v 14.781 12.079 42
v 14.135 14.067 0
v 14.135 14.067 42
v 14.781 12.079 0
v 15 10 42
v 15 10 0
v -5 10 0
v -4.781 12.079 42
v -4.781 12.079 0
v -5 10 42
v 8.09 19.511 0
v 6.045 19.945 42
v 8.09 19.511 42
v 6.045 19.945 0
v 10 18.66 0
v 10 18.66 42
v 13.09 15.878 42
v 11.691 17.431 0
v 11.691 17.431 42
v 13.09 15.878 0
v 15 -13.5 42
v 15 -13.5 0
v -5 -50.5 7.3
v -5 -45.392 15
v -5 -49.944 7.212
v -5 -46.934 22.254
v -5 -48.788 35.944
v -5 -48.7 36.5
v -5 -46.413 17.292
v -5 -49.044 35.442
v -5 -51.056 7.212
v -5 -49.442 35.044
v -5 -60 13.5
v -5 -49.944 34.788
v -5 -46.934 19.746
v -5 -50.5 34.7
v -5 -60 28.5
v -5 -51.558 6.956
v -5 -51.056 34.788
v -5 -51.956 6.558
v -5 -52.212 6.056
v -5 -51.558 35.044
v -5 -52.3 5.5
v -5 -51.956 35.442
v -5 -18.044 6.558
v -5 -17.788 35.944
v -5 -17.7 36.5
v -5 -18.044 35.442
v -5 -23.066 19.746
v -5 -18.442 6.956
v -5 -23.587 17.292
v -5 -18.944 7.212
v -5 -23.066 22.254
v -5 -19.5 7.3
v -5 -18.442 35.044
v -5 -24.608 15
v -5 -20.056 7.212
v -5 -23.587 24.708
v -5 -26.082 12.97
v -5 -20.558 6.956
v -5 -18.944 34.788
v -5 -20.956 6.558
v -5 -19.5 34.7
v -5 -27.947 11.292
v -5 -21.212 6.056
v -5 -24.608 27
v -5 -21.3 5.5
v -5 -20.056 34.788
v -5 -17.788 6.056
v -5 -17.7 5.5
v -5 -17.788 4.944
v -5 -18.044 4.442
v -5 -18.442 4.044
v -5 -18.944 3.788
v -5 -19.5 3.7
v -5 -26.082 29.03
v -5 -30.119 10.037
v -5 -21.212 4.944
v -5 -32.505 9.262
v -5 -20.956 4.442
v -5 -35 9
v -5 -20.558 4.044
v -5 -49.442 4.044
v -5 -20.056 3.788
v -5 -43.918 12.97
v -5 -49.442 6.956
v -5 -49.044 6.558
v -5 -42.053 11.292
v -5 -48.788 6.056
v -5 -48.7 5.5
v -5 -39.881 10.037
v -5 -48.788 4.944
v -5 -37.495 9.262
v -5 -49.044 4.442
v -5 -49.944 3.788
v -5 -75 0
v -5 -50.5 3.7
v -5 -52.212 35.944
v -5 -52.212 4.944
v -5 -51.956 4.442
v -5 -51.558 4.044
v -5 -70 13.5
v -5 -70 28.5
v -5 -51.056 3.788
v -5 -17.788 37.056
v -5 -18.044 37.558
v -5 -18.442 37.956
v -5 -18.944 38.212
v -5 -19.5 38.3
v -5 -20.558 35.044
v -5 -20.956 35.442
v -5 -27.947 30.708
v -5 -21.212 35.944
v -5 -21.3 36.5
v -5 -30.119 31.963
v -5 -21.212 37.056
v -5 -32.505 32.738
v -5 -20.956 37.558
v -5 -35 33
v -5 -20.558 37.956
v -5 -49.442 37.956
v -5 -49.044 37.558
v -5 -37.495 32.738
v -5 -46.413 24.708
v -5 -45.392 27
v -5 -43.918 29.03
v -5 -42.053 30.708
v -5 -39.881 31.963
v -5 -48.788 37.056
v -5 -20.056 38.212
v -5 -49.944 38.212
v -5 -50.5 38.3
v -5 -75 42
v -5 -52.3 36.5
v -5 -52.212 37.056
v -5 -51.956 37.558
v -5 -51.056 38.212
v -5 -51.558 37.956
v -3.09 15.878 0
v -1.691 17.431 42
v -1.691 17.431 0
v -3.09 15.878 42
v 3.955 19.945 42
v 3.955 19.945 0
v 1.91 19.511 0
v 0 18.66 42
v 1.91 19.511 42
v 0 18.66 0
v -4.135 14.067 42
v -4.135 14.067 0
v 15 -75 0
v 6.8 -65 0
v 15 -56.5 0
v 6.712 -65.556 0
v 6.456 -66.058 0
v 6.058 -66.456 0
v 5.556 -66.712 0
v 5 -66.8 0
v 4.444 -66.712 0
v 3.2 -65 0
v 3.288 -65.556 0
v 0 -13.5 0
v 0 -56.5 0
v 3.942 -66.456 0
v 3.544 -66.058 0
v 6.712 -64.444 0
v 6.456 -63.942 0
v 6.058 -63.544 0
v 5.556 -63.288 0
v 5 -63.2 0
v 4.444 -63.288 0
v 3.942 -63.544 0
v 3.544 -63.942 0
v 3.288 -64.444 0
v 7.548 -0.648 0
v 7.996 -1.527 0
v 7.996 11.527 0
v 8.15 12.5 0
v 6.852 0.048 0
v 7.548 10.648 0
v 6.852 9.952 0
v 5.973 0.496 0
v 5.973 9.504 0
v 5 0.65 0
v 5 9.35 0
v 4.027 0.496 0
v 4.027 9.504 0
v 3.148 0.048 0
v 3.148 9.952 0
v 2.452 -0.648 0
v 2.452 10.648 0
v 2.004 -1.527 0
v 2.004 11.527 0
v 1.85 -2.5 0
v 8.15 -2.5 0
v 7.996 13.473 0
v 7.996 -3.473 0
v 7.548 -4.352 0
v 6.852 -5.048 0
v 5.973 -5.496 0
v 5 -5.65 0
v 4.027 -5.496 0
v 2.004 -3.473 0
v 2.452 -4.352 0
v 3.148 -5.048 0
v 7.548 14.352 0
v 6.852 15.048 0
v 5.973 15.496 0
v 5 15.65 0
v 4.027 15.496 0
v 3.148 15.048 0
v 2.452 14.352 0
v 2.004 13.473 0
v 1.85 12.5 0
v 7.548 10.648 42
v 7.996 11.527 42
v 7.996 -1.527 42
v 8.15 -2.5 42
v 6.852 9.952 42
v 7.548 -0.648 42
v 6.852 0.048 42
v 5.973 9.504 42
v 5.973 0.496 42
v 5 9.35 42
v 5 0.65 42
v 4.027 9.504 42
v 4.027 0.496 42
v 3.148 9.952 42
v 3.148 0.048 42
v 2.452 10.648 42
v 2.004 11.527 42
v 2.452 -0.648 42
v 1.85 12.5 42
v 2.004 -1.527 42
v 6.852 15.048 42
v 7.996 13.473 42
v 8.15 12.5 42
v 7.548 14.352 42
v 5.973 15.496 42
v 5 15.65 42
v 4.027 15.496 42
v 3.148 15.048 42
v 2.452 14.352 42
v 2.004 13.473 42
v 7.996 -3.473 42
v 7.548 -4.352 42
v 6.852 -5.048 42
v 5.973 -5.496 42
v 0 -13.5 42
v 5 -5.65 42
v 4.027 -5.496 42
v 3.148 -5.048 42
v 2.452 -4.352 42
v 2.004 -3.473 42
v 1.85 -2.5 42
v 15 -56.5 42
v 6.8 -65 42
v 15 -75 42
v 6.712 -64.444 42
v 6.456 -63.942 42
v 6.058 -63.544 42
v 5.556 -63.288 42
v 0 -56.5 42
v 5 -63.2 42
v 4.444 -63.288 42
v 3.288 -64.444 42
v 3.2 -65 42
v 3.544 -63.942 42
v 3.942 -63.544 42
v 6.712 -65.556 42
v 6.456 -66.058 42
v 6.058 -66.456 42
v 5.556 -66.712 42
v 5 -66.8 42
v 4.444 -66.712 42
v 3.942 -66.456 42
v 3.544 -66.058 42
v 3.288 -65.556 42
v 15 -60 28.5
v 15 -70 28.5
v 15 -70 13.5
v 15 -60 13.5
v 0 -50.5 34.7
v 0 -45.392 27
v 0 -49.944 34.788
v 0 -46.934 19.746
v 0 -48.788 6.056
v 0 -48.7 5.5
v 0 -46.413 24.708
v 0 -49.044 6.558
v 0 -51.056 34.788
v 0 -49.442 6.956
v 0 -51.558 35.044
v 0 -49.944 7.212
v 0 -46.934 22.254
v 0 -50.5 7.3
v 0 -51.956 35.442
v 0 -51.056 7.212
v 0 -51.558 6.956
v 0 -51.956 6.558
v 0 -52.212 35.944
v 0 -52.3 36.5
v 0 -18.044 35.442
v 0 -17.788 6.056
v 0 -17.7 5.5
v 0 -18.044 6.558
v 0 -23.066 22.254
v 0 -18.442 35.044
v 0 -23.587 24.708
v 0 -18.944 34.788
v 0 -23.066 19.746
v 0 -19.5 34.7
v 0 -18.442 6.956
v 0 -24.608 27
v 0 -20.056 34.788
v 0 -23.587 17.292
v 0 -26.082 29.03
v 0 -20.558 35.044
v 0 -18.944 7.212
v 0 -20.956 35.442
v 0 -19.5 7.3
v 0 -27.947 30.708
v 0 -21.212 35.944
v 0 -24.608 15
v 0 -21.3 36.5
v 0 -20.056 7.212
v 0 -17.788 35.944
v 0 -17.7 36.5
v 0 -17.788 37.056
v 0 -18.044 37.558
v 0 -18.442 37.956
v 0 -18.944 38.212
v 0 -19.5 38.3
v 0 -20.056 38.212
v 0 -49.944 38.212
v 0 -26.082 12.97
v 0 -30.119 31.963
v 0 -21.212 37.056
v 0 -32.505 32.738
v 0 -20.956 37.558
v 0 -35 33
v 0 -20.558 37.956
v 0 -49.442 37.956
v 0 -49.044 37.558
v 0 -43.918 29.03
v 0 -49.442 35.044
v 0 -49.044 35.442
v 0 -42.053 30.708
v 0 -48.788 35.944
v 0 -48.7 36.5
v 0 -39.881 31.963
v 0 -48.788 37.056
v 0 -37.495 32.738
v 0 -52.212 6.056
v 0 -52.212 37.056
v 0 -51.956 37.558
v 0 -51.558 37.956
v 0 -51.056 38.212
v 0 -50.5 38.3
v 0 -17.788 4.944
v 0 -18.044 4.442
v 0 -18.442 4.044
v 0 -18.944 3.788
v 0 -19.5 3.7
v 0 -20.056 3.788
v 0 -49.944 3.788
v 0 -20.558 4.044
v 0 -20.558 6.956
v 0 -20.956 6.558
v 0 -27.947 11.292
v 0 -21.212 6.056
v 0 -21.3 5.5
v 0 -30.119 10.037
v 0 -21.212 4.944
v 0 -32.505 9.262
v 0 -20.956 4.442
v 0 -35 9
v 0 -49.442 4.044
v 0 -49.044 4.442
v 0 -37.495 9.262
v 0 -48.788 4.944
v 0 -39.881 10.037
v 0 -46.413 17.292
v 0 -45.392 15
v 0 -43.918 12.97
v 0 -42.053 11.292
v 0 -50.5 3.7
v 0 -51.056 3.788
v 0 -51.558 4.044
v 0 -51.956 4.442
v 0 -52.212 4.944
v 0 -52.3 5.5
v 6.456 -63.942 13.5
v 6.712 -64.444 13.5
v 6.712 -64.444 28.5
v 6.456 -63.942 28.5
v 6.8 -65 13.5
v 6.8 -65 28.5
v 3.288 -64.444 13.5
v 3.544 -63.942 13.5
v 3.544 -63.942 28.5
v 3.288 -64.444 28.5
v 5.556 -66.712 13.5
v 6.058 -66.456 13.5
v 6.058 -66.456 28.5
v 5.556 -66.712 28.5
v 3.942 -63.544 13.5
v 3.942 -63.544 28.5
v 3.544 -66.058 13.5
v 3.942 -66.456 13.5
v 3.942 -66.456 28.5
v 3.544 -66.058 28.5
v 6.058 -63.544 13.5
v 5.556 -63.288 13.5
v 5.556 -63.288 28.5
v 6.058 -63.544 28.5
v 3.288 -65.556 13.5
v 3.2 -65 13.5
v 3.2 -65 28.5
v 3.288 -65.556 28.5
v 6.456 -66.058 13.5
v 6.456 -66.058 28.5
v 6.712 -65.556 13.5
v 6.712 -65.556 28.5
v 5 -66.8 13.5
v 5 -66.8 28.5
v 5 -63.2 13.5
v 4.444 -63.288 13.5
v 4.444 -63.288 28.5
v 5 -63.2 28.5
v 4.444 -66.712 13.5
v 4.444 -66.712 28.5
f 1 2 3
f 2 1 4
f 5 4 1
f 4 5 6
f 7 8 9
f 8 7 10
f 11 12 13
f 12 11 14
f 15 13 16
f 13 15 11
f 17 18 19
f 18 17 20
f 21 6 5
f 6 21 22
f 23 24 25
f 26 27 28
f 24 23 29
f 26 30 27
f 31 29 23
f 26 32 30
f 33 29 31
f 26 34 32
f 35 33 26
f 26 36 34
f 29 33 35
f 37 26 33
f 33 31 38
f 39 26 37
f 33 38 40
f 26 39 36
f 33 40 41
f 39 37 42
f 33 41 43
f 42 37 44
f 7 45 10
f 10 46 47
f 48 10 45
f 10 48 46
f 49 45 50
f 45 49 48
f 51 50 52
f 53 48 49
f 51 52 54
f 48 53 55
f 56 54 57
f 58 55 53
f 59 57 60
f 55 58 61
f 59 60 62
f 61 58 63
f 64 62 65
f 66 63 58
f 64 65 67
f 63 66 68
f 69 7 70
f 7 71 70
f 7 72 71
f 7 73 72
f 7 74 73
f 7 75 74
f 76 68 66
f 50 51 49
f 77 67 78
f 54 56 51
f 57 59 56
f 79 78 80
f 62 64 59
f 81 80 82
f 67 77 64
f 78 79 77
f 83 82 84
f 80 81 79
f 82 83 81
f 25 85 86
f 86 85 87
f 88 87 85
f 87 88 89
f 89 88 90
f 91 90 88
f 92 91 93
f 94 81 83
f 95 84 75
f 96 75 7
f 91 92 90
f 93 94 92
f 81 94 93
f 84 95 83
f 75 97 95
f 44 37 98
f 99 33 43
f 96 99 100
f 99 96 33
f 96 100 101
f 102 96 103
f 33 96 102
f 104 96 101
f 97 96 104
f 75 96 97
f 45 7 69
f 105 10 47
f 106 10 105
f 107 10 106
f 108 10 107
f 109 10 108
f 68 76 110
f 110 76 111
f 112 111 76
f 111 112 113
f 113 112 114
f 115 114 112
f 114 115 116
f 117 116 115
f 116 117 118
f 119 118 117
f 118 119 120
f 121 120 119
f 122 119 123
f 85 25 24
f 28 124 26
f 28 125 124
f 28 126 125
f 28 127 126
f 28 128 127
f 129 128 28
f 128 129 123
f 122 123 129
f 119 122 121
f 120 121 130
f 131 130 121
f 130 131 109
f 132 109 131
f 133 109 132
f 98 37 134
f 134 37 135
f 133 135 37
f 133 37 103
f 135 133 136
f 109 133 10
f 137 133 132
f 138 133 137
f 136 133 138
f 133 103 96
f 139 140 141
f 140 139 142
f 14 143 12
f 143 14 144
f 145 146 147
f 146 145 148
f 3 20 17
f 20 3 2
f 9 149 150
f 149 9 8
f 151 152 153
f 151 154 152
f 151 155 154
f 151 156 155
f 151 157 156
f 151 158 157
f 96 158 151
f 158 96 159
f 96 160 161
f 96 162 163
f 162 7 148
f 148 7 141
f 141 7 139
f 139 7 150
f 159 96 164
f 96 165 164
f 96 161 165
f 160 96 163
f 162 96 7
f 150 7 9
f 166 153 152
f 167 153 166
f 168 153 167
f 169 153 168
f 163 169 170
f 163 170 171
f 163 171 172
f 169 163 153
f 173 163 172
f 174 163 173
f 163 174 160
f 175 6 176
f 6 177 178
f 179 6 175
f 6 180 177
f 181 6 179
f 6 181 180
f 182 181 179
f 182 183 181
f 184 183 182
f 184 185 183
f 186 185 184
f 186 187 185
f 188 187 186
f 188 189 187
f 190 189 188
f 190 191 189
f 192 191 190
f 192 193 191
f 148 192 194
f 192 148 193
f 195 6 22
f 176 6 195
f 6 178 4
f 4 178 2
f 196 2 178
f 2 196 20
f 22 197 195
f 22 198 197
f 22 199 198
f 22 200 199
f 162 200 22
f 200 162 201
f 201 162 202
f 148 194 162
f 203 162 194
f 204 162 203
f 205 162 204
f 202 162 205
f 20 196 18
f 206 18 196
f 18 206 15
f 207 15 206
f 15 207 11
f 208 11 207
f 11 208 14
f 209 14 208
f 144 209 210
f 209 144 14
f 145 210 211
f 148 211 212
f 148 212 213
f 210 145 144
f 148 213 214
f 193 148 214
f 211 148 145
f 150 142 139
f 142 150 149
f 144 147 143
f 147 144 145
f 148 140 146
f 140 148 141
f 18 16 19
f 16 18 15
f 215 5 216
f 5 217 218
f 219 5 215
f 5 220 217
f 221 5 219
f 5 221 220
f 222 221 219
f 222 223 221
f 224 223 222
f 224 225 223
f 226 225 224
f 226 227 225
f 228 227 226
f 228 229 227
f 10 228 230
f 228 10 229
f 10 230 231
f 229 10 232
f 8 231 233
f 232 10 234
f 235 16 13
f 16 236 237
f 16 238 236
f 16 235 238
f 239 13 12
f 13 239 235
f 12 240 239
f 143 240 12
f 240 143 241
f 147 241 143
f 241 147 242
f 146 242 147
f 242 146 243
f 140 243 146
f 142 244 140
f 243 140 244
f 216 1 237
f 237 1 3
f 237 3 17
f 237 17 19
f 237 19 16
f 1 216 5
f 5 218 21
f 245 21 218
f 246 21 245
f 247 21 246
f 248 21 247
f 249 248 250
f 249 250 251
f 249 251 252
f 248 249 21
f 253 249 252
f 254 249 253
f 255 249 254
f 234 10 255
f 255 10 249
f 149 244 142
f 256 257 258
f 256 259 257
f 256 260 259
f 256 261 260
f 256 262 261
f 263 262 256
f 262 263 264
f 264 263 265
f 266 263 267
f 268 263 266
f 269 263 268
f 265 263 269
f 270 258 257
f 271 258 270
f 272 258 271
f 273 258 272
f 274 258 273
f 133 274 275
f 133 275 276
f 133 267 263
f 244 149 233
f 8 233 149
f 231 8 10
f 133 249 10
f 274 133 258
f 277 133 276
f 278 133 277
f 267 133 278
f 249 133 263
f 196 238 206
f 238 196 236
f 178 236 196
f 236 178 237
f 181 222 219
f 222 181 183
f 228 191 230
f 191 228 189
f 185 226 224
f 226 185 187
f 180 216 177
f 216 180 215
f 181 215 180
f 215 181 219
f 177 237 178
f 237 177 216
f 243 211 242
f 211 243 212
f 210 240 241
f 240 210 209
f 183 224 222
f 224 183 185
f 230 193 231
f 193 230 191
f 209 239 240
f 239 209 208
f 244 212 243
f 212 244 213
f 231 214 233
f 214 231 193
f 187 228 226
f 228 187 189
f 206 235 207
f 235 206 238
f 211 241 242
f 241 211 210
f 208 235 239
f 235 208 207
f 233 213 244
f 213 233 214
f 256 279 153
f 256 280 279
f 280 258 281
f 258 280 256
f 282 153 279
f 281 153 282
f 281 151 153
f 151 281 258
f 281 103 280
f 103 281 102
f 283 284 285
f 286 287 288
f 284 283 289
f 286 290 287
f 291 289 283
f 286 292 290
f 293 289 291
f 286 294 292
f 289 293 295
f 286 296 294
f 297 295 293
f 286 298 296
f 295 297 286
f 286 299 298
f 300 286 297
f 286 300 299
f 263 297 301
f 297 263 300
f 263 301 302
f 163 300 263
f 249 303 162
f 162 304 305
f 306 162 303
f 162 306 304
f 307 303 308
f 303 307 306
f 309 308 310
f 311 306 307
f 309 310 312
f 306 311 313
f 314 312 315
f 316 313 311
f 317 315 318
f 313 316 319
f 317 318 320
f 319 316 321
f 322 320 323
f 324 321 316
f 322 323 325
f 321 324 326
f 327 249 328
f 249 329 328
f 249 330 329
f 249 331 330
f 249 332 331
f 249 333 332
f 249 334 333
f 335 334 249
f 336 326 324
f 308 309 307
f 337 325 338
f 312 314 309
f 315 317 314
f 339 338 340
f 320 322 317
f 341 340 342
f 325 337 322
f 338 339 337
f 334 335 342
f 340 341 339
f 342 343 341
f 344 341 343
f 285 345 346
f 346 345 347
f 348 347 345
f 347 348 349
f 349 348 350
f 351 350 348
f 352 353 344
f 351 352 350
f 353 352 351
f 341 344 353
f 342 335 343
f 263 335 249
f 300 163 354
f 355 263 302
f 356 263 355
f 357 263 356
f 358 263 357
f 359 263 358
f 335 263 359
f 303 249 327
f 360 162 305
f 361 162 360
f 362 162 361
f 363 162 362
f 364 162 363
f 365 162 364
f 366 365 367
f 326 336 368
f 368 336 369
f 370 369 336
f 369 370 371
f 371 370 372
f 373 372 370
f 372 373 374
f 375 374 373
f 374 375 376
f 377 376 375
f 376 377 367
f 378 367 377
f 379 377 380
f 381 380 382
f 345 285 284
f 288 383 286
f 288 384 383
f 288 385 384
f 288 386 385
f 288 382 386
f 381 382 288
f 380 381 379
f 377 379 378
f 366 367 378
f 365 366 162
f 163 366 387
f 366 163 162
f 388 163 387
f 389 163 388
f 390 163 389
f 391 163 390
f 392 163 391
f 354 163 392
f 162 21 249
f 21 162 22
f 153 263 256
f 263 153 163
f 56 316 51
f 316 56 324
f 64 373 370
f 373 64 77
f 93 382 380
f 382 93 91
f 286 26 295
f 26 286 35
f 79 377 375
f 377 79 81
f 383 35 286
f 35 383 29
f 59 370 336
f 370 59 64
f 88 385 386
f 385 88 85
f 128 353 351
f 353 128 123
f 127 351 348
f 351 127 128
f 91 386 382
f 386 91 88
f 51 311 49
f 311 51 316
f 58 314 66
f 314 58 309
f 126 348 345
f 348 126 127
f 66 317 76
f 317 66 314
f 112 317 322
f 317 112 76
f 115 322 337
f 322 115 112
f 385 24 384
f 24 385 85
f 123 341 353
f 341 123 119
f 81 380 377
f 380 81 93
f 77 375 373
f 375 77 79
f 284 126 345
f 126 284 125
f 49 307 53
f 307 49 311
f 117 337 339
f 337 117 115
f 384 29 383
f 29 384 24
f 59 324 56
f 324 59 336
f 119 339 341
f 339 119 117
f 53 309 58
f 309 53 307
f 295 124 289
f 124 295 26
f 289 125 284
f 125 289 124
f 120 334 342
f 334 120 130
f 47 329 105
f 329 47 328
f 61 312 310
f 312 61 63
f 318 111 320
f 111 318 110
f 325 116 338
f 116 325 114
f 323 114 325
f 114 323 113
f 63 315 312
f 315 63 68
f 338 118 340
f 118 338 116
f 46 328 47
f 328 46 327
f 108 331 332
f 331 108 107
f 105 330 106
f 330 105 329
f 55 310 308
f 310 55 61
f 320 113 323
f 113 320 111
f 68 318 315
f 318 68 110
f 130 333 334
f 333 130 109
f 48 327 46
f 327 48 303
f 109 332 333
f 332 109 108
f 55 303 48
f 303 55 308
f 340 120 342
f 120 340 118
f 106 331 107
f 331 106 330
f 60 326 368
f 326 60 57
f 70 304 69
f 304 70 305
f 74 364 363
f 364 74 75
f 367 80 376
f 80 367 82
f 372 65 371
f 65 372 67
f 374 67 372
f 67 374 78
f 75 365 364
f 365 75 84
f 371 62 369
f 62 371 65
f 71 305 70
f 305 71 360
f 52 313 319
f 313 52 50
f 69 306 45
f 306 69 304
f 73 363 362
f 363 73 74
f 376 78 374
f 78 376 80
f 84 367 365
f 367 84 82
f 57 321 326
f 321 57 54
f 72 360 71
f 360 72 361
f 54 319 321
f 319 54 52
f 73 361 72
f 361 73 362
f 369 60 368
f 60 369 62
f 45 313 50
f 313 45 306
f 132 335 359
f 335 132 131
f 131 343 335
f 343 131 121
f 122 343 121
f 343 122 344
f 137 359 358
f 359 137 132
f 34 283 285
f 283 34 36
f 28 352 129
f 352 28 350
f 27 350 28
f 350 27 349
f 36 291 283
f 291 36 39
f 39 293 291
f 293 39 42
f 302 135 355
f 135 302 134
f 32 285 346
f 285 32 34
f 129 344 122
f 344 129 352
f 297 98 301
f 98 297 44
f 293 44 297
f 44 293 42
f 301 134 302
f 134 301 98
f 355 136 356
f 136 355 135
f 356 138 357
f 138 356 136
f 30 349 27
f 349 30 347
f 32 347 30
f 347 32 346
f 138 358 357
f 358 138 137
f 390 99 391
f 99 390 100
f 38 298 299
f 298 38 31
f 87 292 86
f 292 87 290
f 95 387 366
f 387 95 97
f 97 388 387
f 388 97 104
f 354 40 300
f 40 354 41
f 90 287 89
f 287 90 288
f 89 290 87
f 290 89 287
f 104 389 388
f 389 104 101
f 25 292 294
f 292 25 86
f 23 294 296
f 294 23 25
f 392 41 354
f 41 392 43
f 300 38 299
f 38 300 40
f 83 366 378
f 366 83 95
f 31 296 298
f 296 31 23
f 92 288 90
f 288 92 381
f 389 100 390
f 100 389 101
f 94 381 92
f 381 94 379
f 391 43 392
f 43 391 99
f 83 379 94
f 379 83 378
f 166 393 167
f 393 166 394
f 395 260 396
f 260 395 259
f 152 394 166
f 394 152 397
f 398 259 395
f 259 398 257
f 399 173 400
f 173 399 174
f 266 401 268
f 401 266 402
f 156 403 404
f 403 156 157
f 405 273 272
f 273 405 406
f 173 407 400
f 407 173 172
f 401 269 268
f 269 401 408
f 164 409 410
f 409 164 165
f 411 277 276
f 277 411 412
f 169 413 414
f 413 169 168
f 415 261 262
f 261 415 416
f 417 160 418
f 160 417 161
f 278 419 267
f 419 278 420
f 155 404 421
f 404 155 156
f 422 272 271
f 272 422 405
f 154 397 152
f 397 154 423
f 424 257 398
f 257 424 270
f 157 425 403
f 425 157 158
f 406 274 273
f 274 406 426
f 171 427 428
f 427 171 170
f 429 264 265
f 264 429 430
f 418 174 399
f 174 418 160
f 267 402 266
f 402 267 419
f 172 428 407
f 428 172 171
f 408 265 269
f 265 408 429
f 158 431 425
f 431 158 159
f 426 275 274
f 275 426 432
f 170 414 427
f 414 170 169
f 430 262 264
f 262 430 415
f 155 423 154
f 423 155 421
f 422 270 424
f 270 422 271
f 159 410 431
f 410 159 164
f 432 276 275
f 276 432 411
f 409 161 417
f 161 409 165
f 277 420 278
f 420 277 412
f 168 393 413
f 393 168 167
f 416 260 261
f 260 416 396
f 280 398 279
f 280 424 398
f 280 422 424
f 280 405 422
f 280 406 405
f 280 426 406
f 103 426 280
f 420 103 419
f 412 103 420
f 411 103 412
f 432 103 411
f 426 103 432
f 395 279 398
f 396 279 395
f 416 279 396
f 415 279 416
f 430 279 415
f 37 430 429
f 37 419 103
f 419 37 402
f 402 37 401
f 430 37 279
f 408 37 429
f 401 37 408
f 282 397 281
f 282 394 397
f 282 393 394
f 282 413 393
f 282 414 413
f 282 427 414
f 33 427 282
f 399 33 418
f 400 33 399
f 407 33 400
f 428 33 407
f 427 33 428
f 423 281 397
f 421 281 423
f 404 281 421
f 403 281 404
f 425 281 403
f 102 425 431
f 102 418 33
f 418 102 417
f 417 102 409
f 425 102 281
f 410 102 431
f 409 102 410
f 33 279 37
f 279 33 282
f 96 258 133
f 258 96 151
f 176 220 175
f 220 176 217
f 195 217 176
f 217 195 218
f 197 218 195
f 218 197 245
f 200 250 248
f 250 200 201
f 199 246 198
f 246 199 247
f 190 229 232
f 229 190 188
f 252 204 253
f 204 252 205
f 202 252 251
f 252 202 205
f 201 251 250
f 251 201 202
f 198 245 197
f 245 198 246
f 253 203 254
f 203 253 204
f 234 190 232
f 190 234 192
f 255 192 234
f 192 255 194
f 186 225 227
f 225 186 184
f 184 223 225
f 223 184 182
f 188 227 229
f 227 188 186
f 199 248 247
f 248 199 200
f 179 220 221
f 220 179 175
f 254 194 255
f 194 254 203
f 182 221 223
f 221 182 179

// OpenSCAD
x=150;
y=250;
z=20;
altura=42; //stepper
radi=10;
f_tornillo=1.8;
rosca=2;
es_forats=10;
rosca=2;

piu = 2.9;
forat_piu = 3.15;


module sup_mot(){
    difference() {
        
    union(){
    difference() {
        
    translate([radi/2,radi,0]) {
        linear_extrude(altura){
            rotate(180){
            circle(radi);
            square([radi, 10]);
            translate([-radi,0])
            square([radi, 10]);
            }
        }
    }
    translate([radi/2, 12.5, -1])
    cylinder(r=forat_piu, h=60, $fn=20);
}
   

    translate([radi/2,-35,altura/2]){
        difference(){
            cube([radi*2,70,altura],center = true);
            translate([(radi/2)-2.5,0,0])
            cube([radi+5,43,altura],center = true);
            rotate([0,90,0])
            cylinder(r=12,h=2*radi+1,center = true);
            
            
            translate([0,15.5,15.5])
            rotate([0,90,0])
            cylinder(r=f_tornillo,h=2*radi+1, $fn=20,center = true);    
            
            translate([0,15.5,-15.5])
            rotate([0,90,0])
            cylinder(r=f_tornillo,h=2*radi+1, $fn=20,center = true);   
            
            translate([0,-15.5,15.5])
            rotate([0,90,0])
            cylinder(r=f_tornillo,h=2*radi+1, $fn=20,center = true);   
            
            translate([0,-15.5,-15.5])
            rotate([0,90,0])
            cylinder(r=f_tornillo,h=2*radi+1, $fn=20,center = true); 

            
            translate([0,-30,0])
            cylinder(r=f_tornillo,h=altura+1, $fn=20,center = true); 
            
            
            translate([0,-30,0])
            cube([2*radi+1,10,15],center = true);
        }
    }
    translate([-radi/2,-75,0])
    cube([2*radi, 5, altura]);
}
    translate([radi/2, -2.5, -1])
    cylinder(r=forat_piu, h=60, $fn=20);
}
}
module im_base(){
    translate([10,10,0])
    rotate([0,90,45])
    part1();
    translate([-10,-10,0])
    rotate([0,90,45])
    part1();
    translate([30,30,0])
    rotate([-90,0,-45])
    part2();
    translate([-30,-30,0])
    rotate([-90,0,-45])
    part2();
}
sup_mot();
